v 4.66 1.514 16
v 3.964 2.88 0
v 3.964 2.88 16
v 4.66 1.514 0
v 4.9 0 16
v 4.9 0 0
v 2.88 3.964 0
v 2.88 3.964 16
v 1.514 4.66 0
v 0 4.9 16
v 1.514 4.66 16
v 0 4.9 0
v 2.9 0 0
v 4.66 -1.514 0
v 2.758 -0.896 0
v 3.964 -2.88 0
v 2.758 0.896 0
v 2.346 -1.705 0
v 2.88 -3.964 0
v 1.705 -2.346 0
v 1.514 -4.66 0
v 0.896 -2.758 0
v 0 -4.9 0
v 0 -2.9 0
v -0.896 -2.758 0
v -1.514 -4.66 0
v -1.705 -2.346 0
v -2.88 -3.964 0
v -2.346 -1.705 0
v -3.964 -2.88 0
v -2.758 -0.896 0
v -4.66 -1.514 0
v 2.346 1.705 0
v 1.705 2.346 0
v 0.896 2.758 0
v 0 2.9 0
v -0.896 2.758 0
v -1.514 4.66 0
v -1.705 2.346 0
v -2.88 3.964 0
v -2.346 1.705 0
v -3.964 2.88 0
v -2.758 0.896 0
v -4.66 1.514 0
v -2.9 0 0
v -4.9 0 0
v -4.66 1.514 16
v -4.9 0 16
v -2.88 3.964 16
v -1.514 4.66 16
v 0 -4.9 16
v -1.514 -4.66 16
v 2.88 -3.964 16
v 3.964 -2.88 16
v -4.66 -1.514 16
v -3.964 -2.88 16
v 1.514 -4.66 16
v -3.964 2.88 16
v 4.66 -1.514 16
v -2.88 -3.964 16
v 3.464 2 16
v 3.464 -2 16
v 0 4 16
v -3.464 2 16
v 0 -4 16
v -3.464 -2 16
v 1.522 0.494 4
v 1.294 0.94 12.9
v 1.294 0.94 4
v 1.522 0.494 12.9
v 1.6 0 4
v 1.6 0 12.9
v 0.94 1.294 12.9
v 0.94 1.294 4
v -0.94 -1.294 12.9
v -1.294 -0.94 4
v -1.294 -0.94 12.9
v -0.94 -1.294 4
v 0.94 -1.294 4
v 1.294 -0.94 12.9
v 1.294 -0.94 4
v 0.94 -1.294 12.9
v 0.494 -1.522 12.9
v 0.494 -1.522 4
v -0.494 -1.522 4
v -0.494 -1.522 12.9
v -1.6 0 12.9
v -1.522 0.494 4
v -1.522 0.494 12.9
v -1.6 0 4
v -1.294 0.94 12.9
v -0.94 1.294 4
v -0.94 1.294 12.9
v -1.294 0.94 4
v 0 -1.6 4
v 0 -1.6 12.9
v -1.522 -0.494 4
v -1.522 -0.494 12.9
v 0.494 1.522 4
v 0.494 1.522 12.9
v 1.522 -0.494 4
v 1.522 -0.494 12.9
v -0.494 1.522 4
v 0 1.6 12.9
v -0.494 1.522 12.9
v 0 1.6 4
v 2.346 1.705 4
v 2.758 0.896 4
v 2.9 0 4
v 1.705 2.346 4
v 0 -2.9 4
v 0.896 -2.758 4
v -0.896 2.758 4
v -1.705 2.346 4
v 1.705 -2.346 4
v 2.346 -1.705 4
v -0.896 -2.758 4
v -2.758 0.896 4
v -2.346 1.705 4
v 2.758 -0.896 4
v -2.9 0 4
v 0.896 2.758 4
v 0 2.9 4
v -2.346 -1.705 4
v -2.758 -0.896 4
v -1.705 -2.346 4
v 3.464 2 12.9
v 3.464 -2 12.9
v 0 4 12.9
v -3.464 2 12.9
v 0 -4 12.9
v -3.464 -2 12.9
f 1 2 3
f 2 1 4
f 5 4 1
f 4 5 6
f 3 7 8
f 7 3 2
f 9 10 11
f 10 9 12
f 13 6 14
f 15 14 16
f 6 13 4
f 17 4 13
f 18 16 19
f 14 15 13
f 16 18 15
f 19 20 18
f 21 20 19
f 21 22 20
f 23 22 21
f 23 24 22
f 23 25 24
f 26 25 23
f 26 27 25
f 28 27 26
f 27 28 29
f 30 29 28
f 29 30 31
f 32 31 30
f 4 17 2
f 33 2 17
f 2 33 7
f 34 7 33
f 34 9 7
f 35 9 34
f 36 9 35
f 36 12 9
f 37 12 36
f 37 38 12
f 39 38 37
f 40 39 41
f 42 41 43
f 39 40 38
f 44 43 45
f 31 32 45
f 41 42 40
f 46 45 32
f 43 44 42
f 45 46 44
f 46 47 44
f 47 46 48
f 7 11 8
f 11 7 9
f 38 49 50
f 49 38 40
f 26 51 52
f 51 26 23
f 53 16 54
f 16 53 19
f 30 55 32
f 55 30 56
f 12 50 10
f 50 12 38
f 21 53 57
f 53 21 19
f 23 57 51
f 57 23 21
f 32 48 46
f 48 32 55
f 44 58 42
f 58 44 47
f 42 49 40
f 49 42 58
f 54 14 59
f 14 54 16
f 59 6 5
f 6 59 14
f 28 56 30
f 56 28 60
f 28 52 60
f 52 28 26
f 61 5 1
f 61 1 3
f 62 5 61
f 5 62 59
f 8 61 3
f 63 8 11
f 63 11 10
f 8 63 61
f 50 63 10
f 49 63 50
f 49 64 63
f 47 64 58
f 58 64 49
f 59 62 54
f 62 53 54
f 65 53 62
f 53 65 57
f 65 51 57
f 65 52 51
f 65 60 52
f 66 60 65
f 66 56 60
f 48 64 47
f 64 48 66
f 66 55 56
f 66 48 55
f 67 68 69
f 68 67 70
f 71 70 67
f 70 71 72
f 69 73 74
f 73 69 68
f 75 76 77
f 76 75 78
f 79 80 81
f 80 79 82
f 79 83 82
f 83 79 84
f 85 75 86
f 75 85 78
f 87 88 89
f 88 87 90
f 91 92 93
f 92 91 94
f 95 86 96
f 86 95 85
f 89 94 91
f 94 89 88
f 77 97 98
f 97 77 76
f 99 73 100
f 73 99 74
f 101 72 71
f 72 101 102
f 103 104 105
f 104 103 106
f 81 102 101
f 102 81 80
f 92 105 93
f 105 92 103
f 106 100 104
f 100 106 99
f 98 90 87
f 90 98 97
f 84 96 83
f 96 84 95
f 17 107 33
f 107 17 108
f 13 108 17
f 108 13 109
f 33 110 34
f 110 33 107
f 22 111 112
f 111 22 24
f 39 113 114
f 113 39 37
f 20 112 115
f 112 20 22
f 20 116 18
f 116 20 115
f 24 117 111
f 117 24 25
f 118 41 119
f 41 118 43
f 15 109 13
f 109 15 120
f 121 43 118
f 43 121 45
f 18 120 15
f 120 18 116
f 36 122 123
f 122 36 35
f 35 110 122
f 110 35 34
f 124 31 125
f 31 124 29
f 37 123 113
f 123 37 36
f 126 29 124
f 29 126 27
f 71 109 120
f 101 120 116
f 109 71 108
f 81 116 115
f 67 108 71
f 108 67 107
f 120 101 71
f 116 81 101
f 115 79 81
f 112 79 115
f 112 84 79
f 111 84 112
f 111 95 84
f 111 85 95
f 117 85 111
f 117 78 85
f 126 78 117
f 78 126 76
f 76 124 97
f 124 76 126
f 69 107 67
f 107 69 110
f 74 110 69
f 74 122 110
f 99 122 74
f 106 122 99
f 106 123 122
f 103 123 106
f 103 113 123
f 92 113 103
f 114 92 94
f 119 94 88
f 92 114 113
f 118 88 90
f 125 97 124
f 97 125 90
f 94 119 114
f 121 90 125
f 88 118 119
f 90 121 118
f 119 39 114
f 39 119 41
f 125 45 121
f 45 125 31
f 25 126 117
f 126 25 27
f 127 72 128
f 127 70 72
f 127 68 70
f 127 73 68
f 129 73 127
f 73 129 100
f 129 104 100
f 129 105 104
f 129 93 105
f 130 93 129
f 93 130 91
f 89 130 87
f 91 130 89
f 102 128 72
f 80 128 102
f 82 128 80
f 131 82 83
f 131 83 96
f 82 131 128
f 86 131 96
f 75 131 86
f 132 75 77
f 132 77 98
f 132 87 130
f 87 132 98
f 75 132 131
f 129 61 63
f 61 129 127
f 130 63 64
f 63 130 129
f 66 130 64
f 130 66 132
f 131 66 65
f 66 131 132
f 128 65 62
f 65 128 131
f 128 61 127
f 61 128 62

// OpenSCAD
// extender from servo to M4 with nut place - one peace
r1i = 5.8/2;
r1o = r1i + 2.0;
h1i = 4.0;
h1o = 6.0;

r2i = 1.6;
r2o = r1o; // r2i + 2.2;
h2 = 10;

nut_r = 8.0/2;
nut_h = 3.2;

$fn=20;


difference() {
  union() {
    cylinder( h=h1o, r=r1o );
    translate( [0,0,h1o] ) cylinder( h=h2, r=r2o );
  }
  cylinder( h=h1o + h2, r=r2i );
  cylinder( h=h1i, r=r1i );
  translate([0,0,h1o+h2-nut_h+0.1]) linear_extrude(nut_h)
  polygon( [ for (a = [0 : 60 : 359]) [ nut_r * sin(a), nut_r * cos(a) ] ] );
}
